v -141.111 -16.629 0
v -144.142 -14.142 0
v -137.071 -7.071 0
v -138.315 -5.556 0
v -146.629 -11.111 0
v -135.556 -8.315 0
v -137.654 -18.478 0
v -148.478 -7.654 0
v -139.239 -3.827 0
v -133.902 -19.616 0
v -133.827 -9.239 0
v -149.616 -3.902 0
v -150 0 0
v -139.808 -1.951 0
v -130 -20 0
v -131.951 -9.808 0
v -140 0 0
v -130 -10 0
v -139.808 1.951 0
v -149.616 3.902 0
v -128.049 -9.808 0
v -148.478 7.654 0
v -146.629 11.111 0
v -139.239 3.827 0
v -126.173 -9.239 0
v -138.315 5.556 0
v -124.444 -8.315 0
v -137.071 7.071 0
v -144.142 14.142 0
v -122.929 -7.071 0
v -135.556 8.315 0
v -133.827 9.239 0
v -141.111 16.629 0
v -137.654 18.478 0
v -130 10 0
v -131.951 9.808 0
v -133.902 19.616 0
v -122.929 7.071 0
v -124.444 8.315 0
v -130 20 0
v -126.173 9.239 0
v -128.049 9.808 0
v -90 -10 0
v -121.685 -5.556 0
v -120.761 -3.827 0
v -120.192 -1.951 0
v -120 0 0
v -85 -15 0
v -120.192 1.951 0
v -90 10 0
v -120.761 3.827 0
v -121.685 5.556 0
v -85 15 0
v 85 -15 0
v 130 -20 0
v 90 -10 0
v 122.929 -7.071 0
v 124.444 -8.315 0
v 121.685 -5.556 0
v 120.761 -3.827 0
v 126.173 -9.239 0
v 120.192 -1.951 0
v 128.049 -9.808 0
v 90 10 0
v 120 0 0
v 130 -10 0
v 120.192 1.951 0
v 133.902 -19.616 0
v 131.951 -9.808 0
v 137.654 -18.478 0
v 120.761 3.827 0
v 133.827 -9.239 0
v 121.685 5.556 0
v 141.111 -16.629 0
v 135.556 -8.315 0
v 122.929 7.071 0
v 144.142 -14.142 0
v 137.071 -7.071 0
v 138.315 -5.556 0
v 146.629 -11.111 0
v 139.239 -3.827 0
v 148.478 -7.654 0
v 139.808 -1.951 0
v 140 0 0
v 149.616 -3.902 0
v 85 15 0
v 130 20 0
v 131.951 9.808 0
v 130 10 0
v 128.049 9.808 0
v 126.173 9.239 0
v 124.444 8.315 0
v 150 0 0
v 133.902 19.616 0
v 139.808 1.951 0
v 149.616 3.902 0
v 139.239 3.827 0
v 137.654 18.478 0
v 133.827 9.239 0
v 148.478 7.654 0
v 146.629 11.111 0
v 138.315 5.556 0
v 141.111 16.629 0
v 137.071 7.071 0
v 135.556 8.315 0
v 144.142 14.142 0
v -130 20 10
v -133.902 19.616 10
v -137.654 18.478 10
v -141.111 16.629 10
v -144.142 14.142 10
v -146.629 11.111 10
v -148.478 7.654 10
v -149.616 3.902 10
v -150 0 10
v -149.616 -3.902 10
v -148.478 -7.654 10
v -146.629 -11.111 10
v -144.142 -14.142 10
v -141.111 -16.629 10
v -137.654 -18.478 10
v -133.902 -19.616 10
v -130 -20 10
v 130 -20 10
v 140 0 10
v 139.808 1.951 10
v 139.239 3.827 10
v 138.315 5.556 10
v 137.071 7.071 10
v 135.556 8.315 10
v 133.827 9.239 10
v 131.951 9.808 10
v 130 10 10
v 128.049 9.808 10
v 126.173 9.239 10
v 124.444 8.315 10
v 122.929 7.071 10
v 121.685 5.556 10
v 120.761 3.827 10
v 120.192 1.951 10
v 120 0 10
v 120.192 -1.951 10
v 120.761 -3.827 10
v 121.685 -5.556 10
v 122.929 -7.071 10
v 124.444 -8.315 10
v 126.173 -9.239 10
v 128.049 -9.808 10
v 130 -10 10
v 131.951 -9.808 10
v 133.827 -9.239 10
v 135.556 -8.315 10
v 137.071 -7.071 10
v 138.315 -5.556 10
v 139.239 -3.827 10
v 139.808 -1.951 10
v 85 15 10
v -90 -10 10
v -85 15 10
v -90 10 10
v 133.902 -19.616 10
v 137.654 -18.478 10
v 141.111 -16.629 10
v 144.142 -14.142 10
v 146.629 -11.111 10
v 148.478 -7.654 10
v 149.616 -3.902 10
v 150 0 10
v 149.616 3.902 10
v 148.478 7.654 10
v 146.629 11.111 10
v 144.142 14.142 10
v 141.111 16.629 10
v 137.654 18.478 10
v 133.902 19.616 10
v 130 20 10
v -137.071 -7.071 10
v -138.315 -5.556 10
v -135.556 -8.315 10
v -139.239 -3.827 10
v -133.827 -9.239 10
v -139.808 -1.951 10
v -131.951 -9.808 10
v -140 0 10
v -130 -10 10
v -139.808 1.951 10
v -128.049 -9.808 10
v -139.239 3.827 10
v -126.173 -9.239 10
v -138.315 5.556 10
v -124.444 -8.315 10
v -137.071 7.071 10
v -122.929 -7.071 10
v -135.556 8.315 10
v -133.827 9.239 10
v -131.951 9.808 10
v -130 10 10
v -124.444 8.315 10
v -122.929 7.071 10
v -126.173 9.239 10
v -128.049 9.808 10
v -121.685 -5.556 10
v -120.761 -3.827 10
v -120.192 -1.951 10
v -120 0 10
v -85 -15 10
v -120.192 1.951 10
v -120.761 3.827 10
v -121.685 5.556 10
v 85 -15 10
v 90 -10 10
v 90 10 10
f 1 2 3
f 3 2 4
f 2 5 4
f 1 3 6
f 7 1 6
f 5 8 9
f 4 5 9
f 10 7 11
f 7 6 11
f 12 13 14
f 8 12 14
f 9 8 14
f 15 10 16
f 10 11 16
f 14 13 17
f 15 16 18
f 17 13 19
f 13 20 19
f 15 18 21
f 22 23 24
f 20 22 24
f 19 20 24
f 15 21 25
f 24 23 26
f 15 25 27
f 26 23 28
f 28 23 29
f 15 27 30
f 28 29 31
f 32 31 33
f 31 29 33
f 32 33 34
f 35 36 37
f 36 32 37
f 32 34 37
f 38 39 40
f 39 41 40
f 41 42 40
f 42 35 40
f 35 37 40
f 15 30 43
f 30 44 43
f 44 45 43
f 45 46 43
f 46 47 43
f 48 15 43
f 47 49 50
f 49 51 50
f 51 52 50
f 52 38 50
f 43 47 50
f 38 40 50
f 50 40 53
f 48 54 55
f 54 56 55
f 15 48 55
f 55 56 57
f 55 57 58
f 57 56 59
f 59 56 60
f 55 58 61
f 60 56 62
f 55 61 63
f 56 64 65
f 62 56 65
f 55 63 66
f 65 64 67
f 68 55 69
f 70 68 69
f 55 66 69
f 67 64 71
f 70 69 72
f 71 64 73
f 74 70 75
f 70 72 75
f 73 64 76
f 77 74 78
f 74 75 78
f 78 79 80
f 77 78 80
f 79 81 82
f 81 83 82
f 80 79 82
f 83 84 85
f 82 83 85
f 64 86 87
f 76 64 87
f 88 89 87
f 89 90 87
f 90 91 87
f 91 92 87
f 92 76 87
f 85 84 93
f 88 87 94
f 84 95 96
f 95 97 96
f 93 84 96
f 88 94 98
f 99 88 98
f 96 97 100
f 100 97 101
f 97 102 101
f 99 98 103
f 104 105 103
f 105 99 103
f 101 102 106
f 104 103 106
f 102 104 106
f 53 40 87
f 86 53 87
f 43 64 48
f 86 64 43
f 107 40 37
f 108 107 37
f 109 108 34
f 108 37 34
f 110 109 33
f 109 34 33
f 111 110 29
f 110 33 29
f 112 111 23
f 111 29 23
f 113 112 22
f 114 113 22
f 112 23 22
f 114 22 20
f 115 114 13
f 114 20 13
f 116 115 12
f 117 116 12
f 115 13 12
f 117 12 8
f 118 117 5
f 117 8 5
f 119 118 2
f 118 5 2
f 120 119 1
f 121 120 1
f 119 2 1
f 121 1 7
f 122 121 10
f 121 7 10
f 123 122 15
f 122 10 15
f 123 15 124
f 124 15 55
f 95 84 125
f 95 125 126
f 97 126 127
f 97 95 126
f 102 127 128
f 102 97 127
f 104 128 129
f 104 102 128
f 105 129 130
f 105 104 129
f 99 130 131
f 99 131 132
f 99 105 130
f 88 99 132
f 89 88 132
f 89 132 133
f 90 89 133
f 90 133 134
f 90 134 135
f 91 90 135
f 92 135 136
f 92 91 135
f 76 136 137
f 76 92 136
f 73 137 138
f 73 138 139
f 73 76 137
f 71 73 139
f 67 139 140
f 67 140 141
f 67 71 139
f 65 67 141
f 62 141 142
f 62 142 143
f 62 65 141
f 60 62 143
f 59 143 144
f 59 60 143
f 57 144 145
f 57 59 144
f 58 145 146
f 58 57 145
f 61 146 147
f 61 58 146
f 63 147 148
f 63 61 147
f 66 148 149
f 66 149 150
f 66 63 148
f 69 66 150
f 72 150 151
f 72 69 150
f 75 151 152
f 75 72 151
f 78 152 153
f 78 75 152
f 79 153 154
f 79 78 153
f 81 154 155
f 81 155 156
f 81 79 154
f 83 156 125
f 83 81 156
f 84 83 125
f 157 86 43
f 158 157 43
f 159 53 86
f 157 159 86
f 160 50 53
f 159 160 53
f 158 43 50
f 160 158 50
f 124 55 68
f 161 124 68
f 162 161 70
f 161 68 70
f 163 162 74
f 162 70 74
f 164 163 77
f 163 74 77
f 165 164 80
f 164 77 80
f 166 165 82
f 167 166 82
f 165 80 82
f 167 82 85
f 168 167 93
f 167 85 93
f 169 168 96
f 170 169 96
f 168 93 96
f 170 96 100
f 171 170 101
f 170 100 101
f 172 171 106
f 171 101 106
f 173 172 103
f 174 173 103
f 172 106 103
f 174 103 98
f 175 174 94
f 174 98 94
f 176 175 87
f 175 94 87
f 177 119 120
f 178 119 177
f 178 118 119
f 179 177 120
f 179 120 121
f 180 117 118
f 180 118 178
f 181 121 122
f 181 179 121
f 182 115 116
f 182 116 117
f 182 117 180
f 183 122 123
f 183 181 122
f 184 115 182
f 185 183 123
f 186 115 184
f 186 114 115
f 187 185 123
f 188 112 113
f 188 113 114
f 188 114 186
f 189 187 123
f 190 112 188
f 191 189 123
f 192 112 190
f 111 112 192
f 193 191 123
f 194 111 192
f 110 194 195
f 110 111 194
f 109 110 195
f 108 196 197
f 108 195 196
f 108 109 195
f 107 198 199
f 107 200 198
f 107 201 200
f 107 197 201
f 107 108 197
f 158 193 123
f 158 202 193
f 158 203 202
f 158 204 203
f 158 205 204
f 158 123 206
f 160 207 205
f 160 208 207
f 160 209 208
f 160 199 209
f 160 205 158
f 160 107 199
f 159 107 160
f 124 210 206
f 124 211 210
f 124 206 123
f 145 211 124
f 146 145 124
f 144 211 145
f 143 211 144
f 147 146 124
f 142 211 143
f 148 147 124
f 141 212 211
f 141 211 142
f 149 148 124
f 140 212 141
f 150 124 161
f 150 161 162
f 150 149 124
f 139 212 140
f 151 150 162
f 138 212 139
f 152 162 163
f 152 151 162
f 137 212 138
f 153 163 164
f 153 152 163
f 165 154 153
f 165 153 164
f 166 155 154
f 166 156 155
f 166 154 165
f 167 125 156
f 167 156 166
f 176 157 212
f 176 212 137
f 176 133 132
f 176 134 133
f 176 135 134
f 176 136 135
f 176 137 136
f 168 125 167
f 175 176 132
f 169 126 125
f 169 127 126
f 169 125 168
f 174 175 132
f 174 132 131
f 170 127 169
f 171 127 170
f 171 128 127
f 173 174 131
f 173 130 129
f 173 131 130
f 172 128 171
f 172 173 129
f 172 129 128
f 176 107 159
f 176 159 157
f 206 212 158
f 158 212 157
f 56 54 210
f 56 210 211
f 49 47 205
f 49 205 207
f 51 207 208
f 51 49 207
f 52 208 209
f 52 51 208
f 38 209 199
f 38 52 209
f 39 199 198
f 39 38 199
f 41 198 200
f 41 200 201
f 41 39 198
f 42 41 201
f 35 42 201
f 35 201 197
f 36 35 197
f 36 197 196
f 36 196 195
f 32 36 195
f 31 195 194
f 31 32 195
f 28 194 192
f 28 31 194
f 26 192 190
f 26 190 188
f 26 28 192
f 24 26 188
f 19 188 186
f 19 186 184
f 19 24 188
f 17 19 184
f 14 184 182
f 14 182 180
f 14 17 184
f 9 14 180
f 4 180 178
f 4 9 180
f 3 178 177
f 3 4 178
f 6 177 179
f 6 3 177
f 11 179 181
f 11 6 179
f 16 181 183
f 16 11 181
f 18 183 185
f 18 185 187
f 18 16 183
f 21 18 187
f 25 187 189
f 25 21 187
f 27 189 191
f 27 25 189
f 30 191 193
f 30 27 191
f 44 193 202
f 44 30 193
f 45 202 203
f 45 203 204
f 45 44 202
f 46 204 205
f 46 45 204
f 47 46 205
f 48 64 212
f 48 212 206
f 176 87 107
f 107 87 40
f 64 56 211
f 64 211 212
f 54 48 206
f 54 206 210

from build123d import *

# Parameters (mm, degrees)
SKETCH1_R           = 10
BOSS_EXTRUDE1_DEPTH = 10


with BuildPart() as part:
    # Sketch1 → Boss-Extrude1 (new body)
    with BuildSketch(Plane.XY):
        with BuildLine():
            Line((-130, -20), (130, -20))
            ThreePointArc((130, -20), (150, 0), (130, 20))
            Line((130, 20), (-130, 20))
            ThreePointArc((-130, 20), (-150, 0), (-130, -20))
        make_face()
        with Locations((130, 0)):
            Circle(SKETCH1_R, mode=Mode.SUBTRACT)
        with Locations((-130, 0)):
            Circle(SKETCH1_R, mode=Mode.SUBTRACT)
        Polygon((-90, 10), (-85, 15), (85, 15), (-90, -10), align=None, mode=Mode.SUBTRACT)
        Polygon((-85, -15), (85, -15), (90, -10), (90, 10), align=None, mode=Mode.SUBTRACT)
    extrude(amount=BOSS_EXTRUDE1_DEPTH)


solid = part.part
